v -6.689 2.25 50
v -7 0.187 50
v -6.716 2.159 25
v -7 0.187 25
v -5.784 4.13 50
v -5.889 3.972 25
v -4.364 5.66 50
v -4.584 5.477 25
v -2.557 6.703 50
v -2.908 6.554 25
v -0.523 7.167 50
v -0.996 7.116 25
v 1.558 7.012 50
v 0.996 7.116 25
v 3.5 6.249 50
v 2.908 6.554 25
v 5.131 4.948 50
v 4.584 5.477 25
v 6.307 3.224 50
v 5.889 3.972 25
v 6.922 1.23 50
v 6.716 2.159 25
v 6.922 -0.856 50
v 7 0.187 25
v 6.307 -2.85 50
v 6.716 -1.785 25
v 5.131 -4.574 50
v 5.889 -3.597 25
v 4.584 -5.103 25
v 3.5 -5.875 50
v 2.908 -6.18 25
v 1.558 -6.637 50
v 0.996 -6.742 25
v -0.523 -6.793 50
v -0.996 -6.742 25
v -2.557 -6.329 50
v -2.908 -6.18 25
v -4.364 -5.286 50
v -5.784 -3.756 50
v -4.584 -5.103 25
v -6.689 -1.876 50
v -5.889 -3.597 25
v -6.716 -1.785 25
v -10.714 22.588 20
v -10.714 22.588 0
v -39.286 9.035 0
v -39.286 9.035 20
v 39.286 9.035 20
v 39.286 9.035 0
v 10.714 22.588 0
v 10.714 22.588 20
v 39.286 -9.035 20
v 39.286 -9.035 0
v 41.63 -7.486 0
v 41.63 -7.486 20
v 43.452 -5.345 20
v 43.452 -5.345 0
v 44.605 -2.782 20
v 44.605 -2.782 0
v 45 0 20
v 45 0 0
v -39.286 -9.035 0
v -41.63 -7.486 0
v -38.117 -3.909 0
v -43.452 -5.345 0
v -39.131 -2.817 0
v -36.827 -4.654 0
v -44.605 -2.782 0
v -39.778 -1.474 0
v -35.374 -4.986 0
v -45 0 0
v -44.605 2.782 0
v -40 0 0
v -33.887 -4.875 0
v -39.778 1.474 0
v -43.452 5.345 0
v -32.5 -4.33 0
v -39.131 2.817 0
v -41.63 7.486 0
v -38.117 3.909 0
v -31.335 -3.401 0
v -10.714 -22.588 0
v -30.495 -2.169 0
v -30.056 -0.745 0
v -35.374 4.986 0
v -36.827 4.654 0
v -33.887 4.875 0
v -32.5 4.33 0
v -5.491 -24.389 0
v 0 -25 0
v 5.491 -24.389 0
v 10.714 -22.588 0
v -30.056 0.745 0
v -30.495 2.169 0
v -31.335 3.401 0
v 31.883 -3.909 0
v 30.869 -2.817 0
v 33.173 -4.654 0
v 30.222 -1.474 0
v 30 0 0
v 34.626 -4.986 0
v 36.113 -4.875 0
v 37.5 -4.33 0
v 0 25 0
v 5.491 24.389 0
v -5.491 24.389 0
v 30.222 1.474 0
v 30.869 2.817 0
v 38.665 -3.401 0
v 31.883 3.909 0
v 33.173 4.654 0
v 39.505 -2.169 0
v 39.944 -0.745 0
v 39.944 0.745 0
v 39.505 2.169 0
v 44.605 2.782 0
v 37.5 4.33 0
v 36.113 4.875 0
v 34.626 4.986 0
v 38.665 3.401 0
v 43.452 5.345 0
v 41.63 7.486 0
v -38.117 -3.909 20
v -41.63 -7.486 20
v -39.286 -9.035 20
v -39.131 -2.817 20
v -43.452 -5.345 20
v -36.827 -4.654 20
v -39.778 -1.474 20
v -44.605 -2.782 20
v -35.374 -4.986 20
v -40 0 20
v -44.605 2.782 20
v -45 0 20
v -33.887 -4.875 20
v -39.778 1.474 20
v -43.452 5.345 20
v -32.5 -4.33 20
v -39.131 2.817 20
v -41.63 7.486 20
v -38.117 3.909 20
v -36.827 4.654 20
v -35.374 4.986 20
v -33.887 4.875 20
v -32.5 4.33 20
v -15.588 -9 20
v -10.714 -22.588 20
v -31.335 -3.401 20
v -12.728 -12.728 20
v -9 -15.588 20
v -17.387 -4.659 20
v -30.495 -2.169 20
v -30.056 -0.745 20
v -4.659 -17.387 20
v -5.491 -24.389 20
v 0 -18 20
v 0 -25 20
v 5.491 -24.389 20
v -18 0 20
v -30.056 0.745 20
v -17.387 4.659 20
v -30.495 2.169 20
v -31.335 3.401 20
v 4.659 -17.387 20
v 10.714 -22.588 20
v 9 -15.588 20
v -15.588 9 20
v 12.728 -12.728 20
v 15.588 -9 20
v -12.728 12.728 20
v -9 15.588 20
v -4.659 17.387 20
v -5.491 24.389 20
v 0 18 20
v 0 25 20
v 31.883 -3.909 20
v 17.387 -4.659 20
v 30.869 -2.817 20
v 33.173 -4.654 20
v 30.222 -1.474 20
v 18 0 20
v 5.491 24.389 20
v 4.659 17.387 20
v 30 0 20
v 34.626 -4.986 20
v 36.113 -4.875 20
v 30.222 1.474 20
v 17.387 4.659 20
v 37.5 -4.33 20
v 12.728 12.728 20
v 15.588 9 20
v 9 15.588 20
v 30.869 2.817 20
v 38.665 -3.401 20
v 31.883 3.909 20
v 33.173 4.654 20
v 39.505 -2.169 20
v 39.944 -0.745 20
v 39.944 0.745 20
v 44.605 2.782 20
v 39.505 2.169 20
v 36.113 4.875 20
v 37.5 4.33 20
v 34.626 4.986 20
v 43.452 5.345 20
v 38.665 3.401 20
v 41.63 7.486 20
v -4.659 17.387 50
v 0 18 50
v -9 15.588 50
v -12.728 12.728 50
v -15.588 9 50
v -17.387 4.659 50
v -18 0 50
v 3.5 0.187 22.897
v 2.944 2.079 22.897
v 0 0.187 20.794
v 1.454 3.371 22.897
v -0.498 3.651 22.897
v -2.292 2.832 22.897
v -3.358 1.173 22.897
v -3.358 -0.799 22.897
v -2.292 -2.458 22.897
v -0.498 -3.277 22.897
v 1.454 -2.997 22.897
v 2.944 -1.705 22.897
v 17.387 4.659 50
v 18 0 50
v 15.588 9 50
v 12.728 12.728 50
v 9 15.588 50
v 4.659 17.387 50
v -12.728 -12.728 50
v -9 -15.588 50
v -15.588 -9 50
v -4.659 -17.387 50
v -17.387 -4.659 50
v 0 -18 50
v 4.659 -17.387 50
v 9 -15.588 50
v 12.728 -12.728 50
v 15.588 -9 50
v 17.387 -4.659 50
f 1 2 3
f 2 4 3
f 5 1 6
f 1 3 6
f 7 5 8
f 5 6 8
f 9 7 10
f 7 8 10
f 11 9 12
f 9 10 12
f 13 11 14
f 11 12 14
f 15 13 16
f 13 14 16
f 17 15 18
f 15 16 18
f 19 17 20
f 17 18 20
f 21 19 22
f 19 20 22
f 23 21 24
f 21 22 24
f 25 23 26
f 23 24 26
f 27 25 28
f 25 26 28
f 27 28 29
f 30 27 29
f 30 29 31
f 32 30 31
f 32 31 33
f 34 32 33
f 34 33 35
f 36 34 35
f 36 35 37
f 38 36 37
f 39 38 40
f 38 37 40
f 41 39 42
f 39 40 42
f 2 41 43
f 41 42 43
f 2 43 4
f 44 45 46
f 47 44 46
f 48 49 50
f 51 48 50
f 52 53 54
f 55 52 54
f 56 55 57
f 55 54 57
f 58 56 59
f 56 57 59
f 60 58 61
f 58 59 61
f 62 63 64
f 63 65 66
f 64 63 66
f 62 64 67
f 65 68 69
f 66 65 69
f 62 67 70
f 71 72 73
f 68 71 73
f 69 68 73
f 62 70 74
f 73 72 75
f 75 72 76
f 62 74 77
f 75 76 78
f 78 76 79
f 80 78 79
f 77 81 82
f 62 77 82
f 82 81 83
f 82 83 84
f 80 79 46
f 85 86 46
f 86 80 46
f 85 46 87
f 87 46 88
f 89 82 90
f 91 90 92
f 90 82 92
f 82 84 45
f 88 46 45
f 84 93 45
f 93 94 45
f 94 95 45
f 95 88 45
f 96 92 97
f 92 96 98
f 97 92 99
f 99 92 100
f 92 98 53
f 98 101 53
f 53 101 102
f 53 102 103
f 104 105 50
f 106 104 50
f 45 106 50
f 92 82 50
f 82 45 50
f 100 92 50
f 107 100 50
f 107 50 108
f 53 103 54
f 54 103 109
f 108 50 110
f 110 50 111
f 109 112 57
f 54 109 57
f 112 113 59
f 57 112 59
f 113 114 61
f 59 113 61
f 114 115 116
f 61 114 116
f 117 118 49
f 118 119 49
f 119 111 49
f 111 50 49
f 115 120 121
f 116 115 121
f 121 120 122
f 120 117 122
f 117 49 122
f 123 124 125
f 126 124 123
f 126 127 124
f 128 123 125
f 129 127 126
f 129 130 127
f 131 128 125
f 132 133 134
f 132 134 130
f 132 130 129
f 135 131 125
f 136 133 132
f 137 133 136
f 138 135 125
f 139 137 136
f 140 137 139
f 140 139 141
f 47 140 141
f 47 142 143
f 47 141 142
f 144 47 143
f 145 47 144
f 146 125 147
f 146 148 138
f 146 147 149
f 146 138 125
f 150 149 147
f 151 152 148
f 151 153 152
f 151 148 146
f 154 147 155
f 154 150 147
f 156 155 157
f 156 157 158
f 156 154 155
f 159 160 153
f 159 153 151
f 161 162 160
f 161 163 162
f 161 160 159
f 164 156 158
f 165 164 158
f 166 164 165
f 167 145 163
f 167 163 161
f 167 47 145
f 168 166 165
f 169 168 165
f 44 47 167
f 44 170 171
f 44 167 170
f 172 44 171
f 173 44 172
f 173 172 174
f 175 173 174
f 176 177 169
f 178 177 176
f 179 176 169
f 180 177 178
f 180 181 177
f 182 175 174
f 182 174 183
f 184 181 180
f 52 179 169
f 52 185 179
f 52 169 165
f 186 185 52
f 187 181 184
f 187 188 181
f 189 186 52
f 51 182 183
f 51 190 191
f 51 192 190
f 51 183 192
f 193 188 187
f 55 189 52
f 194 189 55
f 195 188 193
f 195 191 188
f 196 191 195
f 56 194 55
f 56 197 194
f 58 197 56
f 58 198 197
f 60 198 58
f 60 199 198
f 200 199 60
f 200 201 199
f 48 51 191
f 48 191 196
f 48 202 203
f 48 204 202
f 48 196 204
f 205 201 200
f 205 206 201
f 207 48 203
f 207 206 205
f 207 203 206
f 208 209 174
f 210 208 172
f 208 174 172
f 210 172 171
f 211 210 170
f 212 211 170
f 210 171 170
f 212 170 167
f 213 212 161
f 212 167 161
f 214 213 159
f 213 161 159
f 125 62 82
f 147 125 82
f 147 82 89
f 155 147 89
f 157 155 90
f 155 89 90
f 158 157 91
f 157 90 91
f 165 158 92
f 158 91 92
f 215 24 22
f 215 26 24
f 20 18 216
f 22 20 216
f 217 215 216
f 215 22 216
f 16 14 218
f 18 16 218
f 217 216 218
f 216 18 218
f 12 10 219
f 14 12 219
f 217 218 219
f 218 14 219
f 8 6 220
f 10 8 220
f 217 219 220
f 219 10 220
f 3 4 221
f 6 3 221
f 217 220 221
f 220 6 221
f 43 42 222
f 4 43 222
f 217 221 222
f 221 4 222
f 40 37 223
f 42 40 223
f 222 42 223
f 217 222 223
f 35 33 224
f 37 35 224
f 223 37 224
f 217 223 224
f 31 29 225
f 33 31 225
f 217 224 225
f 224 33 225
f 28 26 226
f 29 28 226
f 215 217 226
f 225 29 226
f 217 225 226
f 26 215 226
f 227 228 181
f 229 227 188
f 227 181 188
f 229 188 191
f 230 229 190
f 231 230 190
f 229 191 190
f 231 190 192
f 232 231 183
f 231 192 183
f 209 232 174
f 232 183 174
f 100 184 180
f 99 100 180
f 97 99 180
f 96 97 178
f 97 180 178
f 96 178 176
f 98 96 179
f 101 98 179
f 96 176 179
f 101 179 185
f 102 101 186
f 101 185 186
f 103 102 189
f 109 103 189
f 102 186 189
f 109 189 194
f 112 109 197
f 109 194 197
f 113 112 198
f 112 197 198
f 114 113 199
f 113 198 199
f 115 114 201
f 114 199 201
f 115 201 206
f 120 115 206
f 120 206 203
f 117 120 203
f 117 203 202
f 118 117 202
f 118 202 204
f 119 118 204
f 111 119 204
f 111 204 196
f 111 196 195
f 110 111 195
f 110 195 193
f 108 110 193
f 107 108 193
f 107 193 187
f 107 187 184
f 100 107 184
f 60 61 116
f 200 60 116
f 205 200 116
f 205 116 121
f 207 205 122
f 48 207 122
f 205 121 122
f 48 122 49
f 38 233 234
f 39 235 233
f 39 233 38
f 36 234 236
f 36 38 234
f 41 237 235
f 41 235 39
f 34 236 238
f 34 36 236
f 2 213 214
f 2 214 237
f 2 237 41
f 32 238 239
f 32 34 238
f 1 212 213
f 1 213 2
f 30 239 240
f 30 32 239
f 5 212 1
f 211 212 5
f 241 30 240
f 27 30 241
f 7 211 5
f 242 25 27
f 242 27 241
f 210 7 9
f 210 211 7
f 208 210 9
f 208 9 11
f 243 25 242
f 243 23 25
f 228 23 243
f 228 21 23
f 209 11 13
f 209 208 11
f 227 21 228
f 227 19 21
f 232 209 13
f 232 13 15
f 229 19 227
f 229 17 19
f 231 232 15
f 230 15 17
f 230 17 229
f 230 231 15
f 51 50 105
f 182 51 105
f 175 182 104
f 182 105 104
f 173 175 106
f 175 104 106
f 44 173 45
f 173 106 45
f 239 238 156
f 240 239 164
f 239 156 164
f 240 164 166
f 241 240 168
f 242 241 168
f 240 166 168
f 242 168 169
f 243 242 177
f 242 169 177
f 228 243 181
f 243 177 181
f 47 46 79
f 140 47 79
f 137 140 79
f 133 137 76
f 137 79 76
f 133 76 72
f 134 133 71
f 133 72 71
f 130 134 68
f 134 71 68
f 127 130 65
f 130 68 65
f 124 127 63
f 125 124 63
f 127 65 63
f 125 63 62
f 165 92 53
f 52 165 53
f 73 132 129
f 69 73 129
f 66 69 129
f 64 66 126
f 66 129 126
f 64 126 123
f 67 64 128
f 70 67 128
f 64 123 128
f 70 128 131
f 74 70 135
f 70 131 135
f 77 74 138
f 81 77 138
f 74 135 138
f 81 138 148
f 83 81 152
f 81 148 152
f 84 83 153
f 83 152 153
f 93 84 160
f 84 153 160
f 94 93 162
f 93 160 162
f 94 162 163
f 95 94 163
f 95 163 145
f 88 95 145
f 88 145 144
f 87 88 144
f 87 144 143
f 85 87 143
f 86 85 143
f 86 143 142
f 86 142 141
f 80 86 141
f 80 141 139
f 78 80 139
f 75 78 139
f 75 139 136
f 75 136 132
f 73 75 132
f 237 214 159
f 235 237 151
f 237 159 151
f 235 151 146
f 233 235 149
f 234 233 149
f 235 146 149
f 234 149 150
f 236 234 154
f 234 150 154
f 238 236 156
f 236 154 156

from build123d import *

# Parameters (mm, degrees)
F1_DEPTH = 20
F3_D     = 10
F4_DEPTH = 30
F6_D     = 14
F6_DEPTH = 25
F6_TIP   = 4.2060243332


with BuildPart() as f1:
    # F0 (on Top) → F1 (new body)
    with BuildSketch(Plane.XY):
        with BuildLine():
            ThreePointArc((-25, 0), (-21.1288563682, 13.3630620956), (-10.7142857143, 22.5876975726))
            Line((-10.7142857143, 22.5876975726), (-39.2857142857, 9.0350790291))
            ThreePointArc((-39.2857142857, 9.0350790291), (-29.6547751618, 8.4515425473), (-25, 0))
        make_face()
        with BuildLine():
            Line((0, 0), (18, 0))
            ThreePointArc((18, 0), (0, 18), (-18, 0))
            Line((-18, 0), (0, 0))
        make_face()
        with BuildLine():
            Line((18, 0), (25, 0))
            ThreePointArc((25, 0), (21.1288563682, 13.3630620956), (10.7142857143, 22.5876975726))
            ThreePointArc((10.7142857143, 22.5876975726), (0, 25), (-10.7142857143, 22.5876975726))
            ThreePointArc((-10.7142857143, 22.5876975726), (-21.1288563682, 13.3630620956), (-25, 0))
            Line((-25, 0), (-18, 0))
            ThreePointArc((-18, 0), (0, 18), (18, 0))
        make_face()
        with BuildLine():
            ThreePointArc((-39.2857142857, -9.0350790291), (-29.6547751618, -8.4515425473), (-25, 0))
            ThreePointArc((-25, 0), (-29.6547751618, 8.4515425473), (-39.2857142857, 9.0350790291))
            ThreePointArc((-39.2857142857, 9.0350790291), (-45, 0), (-39.2857142857, -9.0350790291))
        make_face()
        with BuildLine():
            Line((-39.2857142857, -9.0350790291), (-10.7142857143, -22.5876975726))
            ThreePointArc((-10.7142857143, -22.5876975726), (-21.1288563682, -13.3630620956), (-25, 0))
            ThreePointArc((-25, 0), (-29.6547751618, -8.4515425473), (-39.2857142857, -9.0350790291))
        make_face()
        with BuildLine():
            ThreePointArc((39.2857142857, -9.0350790291), (29.6547751618, -8.4515425473), (25, 0))
            ThreePointArc((25, 0), (21.1288563682, -13.3630620956), (10.7142857143, -22.5876975726))
            Line((10.7142857143, -22.5876975726), (39.2857142857, -9.0350790291))
        make_face()
        with BuildLine():
            ThreePointArc((-18, 0), (0, -18), (18, 0))
            Line((18, 0), (0, 0))
            Line((0, 0), (-18, 0))
        make_face()
        with BuildLine():
            ThreePointArc((10.7142857143, -22.5876975726), (21.1288563682, -13.3630620956), (25, 0))
            Line((25, 0), (18, 0))
            ThreePointArc((18, 0), (0, -18), (-18, 0))
            Line((-18, 0), (-25, 0))
            ThreePointArc((-25, 0), (-21.1288563682, -13.3630620956), (-10.7142857143, -22.5876975726))
            ThreePointArc((-10.7142857143, -22.5876975726), (0, -25), (10.7142857143, -22.5876975726))
        make_face()
        with BuildLine():
            ThreePointArc((39.2857142857, 9.0350790291), (29.6547751618, 8.4515425473), (25, 0))
            ThreePointArc((25, 0), (29.6547751618, -8.4515425473), (39.2857142857, -9.0350790291))
            ThreePointArc((39.2857142857, -9.0350790291), (43.4515425473, -5.3452248382), (45, 0))
            ThreePointArc((45, 0), (43.4515425473, 5.3452248382), (39.2857142857, 9.0350790291))
        make_face()
        with BuildLine():
            ThreePointArc((10.7142857143, 22.5876975726), (21.1288563682, 13.3630620956), (25, 0))
            ThreePointArc((25, 0), (29.6547751618, 8.4515425473), (39.2857142857, 9.0350790291))
            Line((39.2857142857, 9.0350790291), (10.7142857143, 22.5876975726))
        make_face()
    extrude(amount=F1_DEPTH)

    # F3 (through all)
    with Locations(Plane(origin=(0, 0, 0), x_dir=(1, 0, 0), z_dir=(0, 0, -1))):
        with Locations((-35, 0), (35, 0)):
            Hole(F3_D / 2)

    # F2 (on face) → F4 (join)
    with BuildSketch(Plane.XY.offset(20)):
        with BuildLine():
            Line((0, -18), (0, 0))
            Line((0, 0), (-18, 0))
            ThreePointArc((-18, 0), (-12.7279220614, -12.7279220614), (0, -18))
        make_face()
        with BuildLine():
            Line((-18, 0), (0, 0))
            Line((0, 0), (0, 18))
            ThreePointArc((0, 18), (-12.7279220614, 12.7279220614), (-18, 0))
        make_face()
        with BuildLine():
            Line((0, 0), (18, 0))
            ThreePointArc((18, 0), (12.7279220614, 12.7279220614), (0, 18))
            Line((0, 18), (0, 0))
        make_face()
        with BuildLine():
            ThreePointArc((0, -18), (12.7279220614, -12.7279220614), (18, 0))
            Line((18, 0), (0, 0))
            Line((0, 0), (0, -18))
        make_face()
    extrude(amount=F4_DEPTH)

    # F6
    with Locations(Plane.XY.offset(50)):
        with Locations((0, 0.1870505988)):
            Hole(F6_D / 2, depth=F6_DEPTH)
            with Locations((0, 0, -(F6_DEPTH + F6_TIP / 2))):  # 118° drill point
                Cone(0, F6_D / 2, F6_TIP, mode=Mode.SUBTRACT)


solid = f1.part
